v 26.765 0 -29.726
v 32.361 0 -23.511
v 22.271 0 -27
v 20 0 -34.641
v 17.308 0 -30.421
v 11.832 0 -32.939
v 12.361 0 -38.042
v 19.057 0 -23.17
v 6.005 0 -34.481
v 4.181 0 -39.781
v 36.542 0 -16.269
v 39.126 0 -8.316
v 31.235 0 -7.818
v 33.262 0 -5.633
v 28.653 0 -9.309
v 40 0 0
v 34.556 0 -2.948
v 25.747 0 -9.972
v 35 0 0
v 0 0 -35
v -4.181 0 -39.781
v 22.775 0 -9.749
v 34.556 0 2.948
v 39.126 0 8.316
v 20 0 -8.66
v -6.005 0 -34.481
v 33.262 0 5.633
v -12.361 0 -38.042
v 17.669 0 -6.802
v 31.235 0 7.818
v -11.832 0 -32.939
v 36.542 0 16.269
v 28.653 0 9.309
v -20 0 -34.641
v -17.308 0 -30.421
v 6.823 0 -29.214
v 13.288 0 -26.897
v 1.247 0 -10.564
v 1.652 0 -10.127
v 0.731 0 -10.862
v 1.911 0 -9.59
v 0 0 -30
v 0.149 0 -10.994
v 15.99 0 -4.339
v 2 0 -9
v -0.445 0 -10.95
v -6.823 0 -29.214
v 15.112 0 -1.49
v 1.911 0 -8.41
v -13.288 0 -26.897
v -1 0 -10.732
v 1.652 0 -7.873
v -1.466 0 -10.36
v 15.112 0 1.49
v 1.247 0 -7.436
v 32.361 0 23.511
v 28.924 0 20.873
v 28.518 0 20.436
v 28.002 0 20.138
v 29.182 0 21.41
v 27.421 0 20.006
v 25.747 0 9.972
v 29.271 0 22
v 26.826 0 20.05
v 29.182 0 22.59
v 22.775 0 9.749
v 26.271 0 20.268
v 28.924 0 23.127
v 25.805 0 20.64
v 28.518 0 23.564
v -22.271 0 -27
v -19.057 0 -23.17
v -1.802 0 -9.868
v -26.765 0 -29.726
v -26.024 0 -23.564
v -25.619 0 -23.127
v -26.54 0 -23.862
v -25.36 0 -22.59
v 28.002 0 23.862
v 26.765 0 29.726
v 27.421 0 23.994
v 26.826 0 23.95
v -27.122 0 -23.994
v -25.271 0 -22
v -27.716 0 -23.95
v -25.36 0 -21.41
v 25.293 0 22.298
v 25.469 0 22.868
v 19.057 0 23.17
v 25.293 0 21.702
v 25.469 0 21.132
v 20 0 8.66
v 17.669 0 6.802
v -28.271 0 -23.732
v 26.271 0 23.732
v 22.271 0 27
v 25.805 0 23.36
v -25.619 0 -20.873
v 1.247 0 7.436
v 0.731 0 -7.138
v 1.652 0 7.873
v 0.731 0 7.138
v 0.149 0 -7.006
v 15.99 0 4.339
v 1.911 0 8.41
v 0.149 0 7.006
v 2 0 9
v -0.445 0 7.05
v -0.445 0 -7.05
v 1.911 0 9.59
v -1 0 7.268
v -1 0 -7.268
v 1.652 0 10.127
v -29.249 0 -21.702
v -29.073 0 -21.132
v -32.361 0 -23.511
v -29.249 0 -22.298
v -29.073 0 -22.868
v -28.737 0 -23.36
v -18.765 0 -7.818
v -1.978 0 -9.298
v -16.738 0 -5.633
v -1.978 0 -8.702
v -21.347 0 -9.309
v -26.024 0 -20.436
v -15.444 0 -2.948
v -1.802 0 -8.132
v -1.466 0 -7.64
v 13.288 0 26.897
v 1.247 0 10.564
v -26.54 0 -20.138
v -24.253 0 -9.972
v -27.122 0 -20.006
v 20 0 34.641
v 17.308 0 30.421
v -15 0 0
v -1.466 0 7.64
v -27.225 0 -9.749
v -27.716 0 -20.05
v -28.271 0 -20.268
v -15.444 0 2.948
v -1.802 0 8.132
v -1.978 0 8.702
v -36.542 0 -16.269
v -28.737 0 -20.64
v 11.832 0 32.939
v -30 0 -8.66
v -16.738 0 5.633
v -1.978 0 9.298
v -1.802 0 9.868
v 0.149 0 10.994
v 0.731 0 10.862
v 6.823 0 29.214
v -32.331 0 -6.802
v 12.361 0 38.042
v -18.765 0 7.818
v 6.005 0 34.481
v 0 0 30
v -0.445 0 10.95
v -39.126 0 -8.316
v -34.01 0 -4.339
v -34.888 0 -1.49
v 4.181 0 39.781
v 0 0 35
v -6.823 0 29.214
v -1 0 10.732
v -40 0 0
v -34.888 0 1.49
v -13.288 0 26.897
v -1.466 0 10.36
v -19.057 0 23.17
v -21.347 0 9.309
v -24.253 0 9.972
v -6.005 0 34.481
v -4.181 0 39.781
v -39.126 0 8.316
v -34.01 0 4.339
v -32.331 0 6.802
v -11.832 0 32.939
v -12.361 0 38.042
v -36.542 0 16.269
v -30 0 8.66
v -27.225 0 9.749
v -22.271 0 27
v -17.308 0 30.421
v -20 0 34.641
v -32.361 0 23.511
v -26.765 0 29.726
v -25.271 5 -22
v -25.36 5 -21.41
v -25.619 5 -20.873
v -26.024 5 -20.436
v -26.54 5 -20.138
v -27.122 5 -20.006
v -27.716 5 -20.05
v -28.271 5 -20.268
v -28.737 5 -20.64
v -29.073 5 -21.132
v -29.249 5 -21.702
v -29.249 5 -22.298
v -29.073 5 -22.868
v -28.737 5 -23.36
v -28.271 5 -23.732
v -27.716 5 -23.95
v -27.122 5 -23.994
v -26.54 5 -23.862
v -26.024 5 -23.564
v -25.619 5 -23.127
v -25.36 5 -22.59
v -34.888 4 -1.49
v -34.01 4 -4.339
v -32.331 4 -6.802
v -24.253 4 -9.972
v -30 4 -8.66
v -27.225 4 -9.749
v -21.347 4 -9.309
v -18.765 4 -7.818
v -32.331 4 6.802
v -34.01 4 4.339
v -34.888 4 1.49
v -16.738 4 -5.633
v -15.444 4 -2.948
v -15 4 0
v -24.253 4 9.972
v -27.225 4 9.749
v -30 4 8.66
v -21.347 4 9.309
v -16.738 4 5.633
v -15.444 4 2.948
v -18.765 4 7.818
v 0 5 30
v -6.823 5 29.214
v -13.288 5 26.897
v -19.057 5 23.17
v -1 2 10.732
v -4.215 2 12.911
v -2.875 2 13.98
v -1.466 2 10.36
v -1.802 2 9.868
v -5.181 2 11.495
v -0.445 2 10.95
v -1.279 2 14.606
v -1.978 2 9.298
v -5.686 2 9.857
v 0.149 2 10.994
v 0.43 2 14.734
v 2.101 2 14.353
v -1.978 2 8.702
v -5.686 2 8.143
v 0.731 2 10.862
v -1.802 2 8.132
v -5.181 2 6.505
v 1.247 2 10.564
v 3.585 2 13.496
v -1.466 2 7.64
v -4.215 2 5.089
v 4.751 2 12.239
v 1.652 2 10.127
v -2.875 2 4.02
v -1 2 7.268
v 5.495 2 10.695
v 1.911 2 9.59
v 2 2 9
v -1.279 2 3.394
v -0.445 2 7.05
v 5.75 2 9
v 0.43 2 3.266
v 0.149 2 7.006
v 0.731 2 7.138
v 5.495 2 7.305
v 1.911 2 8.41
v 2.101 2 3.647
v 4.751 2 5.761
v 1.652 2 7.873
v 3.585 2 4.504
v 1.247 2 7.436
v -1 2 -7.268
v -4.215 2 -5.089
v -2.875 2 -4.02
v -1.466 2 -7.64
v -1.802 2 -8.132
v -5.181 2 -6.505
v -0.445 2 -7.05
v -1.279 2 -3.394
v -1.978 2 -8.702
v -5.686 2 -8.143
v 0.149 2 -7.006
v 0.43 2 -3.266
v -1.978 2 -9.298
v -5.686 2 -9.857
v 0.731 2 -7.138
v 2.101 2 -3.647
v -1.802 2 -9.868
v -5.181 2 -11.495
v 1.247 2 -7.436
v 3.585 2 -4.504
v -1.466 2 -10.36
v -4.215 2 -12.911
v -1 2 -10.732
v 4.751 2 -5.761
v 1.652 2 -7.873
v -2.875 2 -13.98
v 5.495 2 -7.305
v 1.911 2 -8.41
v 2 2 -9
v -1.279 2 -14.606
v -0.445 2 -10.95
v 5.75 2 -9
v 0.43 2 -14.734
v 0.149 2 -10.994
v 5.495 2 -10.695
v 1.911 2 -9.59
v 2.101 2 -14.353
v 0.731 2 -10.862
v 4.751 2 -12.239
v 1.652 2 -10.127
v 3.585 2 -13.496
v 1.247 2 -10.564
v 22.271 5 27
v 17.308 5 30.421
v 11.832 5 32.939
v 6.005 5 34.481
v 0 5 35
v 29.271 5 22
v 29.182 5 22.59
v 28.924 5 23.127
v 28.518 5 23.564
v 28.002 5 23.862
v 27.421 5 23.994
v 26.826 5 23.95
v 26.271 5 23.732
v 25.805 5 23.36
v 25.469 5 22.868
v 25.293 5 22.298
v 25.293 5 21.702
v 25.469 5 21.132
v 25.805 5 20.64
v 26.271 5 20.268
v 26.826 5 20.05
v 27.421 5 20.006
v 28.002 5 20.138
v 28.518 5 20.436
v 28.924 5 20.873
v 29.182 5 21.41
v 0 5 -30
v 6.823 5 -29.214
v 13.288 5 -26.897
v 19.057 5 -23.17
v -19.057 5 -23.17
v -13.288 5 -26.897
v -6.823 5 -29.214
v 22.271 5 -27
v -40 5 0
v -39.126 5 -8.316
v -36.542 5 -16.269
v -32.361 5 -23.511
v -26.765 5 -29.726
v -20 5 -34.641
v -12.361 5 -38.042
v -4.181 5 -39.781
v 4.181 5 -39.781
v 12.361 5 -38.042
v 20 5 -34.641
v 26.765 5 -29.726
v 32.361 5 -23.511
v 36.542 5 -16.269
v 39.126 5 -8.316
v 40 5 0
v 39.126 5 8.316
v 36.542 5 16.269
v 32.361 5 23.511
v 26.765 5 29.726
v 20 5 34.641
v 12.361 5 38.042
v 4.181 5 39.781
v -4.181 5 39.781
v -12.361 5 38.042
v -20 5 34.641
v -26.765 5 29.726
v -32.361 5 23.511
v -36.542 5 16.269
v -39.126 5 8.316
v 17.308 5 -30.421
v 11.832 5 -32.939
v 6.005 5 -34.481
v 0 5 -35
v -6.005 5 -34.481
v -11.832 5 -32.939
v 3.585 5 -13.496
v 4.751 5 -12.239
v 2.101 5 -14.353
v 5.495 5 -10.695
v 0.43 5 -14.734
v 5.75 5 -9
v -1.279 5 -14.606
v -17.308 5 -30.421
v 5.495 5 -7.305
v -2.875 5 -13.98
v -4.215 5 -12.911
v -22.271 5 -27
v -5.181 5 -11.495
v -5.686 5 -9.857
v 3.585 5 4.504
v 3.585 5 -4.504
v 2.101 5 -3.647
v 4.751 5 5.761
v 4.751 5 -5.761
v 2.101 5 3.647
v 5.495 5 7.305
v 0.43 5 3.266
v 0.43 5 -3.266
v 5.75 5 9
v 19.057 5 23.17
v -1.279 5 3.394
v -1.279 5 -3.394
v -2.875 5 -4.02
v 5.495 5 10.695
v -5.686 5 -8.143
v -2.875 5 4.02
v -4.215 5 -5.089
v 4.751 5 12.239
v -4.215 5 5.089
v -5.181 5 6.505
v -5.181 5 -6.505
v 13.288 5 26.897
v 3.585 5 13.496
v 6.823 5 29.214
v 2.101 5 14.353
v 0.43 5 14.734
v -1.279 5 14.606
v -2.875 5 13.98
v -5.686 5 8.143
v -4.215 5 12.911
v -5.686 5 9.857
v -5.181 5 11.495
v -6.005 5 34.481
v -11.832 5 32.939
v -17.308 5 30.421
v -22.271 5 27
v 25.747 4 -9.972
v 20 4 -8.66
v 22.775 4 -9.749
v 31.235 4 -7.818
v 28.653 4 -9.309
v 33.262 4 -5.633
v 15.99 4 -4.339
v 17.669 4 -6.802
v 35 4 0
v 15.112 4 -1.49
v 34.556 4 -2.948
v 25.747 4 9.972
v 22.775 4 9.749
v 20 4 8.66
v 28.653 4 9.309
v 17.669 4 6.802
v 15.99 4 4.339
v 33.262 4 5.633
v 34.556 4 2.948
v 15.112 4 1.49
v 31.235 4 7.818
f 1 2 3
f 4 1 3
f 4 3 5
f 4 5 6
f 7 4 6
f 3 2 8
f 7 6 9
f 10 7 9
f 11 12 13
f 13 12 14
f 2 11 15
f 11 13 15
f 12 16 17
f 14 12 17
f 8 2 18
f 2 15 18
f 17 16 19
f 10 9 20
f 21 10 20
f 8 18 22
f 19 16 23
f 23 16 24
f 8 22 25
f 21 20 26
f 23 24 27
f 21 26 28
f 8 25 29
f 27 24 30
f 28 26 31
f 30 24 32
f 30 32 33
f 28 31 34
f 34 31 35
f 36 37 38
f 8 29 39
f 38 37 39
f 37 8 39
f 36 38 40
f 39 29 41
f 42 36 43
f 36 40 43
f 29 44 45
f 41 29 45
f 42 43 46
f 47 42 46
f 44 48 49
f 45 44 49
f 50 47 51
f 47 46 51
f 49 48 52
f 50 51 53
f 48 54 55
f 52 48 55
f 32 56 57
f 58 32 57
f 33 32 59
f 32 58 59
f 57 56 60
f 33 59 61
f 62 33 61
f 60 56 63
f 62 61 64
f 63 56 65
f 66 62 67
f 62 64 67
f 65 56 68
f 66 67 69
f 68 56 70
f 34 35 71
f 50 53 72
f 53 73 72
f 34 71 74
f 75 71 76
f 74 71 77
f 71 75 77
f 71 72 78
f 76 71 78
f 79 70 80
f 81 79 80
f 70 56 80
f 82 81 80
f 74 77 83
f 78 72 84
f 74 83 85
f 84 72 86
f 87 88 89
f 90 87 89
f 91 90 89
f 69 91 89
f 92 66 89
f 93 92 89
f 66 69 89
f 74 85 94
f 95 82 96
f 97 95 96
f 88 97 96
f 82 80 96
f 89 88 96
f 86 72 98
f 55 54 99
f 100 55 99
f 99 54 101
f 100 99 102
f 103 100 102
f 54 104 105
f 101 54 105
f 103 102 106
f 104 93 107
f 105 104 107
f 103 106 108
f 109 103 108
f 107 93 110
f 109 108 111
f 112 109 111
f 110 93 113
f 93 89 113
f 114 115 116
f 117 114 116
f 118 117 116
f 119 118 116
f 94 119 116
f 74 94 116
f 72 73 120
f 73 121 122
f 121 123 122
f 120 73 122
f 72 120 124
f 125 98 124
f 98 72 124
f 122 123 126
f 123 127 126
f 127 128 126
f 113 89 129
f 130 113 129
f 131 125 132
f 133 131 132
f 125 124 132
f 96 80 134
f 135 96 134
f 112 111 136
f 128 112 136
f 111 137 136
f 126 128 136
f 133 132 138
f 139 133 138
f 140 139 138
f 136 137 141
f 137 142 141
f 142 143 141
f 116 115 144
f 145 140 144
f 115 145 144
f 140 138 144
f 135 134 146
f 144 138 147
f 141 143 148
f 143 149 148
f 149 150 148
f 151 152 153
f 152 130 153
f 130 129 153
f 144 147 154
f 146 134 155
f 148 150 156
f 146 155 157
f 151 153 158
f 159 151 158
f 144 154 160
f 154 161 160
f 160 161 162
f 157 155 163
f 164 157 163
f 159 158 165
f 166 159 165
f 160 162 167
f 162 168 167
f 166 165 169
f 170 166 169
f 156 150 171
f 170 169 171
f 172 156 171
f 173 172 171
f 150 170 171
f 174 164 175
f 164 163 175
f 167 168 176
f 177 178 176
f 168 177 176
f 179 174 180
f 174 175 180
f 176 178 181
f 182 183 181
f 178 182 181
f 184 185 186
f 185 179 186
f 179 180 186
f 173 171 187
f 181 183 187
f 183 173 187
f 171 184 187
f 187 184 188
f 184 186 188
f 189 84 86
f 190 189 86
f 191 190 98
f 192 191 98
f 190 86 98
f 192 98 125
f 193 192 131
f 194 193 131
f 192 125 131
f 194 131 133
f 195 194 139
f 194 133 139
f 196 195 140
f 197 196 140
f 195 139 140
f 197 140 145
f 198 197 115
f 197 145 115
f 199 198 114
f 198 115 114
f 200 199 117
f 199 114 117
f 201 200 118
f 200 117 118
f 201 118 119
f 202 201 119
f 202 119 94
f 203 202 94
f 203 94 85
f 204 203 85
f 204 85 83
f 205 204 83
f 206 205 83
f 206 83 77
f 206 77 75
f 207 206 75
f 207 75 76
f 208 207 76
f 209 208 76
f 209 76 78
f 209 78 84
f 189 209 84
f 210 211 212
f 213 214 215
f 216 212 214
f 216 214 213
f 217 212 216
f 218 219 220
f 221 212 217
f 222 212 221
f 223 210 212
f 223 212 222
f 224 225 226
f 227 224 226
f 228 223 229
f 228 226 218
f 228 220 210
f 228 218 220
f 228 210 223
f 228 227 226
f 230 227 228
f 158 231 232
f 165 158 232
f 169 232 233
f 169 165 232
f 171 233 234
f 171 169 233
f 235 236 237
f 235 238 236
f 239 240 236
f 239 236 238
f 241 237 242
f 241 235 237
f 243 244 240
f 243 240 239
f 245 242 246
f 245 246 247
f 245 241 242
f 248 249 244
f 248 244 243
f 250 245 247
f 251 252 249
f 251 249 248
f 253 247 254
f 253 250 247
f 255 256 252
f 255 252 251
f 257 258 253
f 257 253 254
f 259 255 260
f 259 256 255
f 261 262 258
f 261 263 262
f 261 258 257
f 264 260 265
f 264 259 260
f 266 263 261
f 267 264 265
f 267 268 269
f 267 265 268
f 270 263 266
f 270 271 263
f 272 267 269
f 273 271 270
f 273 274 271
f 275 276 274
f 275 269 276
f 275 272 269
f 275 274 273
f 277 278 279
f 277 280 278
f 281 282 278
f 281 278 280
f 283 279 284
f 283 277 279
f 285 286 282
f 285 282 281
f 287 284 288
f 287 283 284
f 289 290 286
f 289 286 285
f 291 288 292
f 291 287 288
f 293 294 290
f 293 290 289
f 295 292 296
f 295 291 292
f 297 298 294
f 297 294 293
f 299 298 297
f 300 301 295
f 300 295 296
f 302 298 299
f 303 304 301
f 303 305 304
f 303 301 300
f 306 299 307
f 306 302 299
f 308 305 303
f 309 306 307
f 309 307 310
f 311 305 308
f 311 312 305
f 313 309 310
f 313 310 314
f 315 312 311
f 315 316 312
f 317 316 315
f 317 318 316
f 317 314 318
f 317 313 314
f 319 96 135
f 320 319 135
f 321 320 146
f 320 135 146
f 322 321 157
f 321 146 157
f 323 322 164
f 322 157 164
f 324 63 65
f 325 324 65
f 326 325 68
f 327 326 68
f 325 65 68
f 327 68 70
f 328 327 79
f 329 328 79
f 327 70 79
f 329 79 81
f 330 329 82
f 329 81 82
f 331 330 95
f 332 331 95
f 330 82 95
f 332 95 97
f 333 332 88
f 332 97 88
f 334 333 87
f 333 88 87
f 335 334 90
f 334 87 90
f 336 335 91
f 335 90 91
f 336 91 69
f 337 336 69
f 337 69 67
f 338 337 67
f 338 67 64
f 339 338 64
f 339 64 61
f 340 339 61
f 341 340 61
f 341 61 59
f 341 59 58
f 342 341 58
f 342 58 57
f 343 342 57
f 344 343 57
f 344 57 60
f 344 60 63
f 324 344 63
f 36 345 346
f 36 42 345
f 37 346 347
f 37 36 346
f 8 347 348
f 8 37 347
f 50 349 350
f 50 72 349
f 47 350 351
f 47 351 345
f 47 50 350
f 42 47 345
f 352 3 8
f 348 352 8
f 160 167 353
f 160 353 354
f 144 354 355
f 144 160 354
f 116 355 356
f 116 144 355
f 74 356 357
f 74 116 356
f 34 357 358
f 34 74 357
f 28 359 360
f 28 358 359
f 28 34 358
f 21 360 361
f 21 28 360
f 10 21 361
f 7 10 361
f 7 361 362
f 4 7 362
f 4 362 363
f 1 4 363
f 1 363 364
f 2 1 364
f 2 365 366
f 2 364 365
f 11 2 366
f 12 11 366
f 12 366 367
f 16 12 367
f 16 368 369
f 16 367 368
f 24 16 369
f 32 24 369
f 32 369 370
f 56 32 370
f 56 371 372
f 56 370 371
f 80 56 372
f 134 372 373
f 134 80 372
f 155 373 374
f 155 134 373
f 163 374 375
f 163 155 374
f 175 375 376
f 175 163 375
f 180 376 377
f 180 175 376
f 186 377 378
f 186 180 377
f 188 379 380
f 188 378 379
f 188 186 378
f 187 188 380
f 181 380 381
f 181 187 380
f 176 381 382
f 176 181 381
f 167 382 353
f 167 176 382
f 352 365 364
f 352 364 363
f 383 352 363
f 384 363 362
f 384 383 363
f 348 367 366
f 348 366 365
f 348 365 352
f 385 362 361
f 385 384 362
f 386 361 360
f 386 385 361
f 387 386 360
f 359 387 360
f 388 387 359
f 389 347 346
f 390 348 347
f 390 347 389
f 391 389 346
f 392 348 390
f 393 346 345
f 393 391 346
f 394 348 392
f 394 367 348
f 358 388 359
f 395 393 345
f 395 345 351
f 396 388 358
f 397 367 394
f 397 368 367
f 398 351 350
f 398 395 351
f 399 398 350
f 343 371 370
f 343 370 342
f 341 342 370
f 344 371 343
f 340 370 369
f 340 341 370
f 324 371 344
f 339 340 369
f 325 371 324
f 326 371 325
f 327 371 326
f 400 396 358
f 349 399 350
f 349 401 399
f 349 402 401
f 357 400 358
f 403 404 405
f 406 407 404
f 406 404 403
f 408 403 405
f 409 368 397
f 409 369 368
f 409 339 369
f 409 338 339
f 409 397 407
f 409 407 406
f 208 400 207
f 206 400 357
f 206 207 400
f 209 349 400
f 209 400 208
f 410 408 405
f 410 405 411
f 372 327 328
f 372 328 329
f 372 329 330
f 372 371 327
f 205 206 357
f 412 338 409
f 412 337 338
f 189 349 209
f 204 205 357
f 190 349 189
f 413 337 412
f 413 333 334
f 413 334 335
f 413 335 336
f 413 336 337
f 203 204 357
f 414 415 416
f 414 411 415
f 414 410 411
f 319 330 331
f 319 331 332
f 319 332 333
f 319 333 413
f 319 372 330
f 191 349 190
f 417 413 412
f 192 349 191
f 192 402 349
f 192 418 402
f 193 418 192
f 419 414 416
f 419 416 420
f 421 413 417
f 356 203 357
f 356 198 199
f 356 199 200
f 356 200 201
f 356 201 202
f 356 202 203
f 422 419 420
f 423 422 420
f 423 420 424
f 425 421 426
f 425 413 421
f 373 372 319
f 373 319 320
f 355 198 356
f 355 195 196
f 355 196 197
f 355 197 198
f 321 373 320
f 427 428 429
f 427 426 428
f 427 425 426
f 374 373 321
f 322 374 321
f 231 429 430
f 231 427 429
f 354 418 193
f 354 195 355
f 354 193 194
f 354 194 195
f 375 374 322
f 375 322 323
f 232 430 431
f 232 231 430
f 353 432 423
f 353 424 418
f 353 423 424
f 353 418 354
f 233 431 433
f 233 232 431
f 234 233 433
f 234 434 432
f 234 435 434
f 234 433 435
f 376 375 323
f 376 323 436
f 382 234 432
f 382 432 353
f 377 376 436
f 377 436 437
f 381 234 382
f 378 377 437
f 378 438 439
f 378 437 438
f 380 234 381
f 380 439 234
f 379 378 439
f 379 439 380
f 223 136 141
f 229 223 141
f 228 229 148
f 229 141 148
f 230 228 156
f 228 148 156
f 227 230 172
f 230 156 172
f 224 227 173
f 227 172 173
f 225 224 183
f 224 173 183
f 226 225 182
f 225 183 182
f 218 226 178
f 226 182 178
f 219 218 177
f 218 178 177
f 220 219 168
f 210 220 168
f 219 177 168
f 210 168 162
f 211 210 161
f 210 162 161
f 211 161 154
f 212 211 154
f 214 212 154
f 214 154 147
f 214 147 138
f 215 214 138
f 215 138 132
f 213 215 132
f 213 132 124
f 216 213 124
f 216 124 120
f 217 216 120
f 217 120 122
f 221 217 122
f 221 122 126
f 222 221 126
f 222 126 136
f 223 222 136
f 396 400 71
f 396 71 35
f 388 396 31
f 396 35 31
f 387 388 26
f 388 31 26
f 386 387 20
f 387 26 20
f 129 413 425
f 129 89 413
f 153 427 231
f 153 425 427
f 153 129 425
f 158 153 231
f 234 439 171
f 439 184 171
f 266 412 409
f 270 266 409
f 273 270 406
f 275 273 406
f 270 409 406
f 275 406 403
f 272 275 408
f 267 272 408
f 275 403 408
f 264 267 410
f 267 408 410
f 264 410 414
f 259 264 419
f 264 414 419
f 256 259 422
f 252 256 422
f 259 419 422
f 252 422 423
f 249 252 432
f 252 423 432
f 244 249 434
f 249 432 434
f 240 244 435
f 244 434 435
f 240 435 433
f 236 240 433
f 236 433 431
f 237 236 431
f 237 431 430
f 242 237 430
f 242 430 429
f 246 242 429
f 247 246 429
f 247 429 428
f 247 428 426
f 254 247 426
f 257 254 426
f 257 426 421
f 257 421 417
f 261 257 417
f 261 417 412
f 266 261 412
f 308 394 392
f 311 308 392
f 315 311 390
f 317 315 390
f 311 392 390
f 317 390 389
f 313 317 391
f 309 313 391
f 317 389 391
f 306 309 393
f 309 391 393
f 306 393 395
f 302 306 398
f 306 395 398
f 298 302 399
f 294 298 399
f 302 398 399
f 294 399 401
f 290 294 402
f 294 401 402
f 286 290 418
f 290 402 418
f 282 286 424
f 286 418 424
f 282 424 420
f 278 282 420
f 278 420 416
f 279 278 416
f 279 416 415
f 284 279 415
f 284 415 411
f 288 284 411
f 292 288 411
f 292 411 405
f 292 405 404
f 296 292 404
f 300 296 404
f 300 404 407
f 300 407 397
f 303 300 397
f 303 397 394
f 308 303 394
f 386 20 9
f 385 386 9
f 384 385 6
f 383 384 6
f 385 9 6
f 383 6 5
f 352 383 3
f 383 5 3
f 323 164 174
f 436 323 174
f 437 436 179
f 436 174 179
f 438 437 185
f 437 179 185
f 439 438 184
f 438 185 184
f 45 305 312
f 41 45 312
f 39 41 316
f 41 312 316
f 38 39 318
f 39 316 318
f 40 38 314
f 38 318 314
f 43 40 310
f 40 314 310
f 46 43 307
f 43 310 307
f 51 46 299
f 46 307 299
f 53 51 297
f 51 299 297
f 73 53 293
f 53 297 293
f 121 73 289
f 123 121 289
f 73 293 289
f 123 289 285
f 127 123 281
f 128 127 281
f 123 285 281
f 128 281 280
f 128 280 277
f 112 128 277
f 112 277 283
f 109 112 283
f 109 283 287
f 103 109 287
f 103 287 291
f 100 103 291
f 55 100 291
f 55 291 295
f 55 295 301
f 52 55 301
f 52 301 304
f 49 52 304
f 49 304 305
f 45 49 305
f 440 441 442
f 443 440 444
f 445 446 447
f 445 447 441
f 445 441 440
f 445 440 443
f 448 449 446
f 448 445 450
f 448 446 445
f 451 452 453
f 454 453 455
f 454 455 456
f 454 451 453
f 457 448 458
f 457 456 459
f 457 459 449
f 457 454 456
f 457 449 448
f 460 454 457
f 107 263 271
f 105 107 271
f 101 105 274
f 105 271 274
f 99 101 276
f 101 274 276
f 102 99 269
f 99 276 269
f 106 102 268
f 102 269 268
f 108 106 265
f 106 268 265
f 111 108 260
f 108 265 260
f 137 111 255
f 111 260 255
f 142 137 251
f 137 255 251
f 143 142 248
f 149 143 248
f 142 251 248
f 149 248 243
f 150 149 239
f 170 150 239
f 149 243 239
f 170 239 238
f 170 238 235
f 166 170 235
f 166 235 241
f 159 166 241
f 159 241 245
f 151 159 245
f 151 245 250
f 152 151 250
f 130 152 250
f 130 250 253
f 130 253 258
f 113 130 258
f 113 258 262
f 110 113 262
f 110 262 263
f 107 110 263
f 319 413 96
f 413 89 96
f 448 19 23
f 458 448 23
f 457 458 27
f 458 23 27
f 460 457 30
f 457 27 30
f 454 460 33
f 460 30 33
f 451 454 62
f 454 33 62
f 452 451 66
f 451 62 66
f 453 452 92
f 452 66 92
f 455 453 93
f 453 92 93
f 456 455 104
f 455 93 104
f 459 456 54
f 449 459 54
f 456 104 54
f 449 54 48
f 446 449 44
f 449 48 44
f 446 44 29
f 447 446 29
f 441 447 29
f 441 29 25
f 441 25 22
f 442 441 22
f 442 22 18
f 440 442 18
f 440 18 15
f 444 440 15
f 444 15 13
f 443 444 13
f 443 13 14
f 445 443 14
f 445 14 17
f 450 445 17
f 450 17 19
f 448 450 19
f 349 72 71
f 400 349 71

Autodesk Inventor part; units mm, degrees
ref_plane "YZ Plane" through (0, 0, 0) normal (1, 0, 0) x (0, 1, 0)
ref_plane "XZ Plane" through (0, 0, 0) normal (0, 1, 0) x (-1, 0, 0)
sketch "Sketch1" plane through (0, 0, 0) normal (0, 1, 0) x (-1, 0, 0)
  circle A0 centre (0, 0) radius 40
  dimension "d0" = 80
sketch "Sketch1 outline for Extrusion1" plane through (0, 0, 0) normal (0, 1, 0) x (-1, 0, 0)
  circle A0 centre (0, 0) radius 40
extrude "Extrusion1" add sketch "Sketch1 outline for Extrusion1" along normal blind 5
sketch "Sketch3" plane through (0, 5, 0) normal (0, 1, 0) x (1, 0, 0)
  line L0 (0, 0) -> (-5, 0)
  line L1 (0, 0) -> (5, 0)
  line L2 (0, 0) -> (0, -9)
  line L3 (0, 0) -> (0, 9)
  circle A0 centre (0, 9) radius 2
  circle A1 centre (0, -9) radius 2
  dimension "d63" = 9
  dimension "d64" = 9
  dimension "d65" = 4
  dimension "d66" = 4
sketch "Sketch3 outline for Extrusion3" plane through (0, 5, 0) normal (0, 1, 0) x (1, 0, 0)
  circle A0 centre (0, 9) radius 2
  circle A1 centre (0, -9) radius 2
extrude "Extrusion3" cut sketch "Sketch3 outline for Extrusion3" against normal up to surface (5 mm away)
sketch "Sketch6" plane through (0, 0, 0) normal (0, -1, 0) x (1, 0, 0)
  line L0 (0, 0) -> (-25, 0)
  line L1 (0, 0) -> (25, 0)
  circle A0 centre (25, 0) radius 10
  circle A1 centre (-25, 0) radius 10
  dimension "d18" = 25
  dimension "d19" = 25
  dimension "d20" = 20
  dimension "d21" = 20
sketch "Sketch6 outline for Extrusion5" plane through (0, 0, 0) normal (0, -1, 0) x (1, 0, 0)
  circle A0 centre (25, 0) radius 10
  circle A1 centre (-25, 0) radius 10
extrude "Extrusion5" cut sketch "Sketch6 outline for Extrusion5" against normal blind 4
sketch "Sketch8" plane through (0, 0, 0) normal (0, -1, 0) x (1, 0, 0)
  circle A0 centre (0, 0) radius 40
  line L0 (0, 40) -> (0, 35)
  line L1 (0, 35) -> (0, 30)
  line L2 (0, 30) -> (0, 27)
  circle A1 centre (0, 0) radius 35
  circle A2 centre (0, 0) radius 30
  line L3 (0, 27) -> (30, 27)
  line L4 (22.271057, 27) -> (19.056987, 23.169619)
  line L5 (22.271057, 27) -> (27.271264, 27) construction
  line L6 (-40, 0) -> (40, 0)
  line L7 (22.271057, -27) -> (19.056987, -23.169619)
  line L8 (0, -40) -> (0, -30)
  point P0 (0, -35)
  dimension "d46" = 5
  dimension "d47" = 5
  dimension "d48" = 3
  dimension "d49" = 130
sketch "Sketch8 outline for Extrusion7" plane through (0, 0, 0) normal (0, -1, 0) x (1, 0, 0)
  line L0 (0, -30) -> (0, -35)
  arc A0 (19.056987, -23.169619) -> (0, -30) centre (0, 0) cw
  line L1 (22.271057, -27) -> (19.056987, -23.169619)
  arc A1 (0, -35) -> (22.271057, -27) centre (0, 0) ccw
  arc A2 (22.271057, 27) -> (0, 35) centre (0, 0) ccw
  line L2 (19.056987, 23.169619) -> (22.271057, 27)
  arc A3 (0, 30) -> (19.056987, 23.169619) centre (0, 0) cw
  line L3 (0, 35) -> (0, 30)
extrude "Extrusion7" cut sketch "Sketch8 outline for Extrusion7" against normal up to surface (5 mm away)
ref_plane "Work Plane1" through (0, 0, 32.5) normal (1, 0, 0) x (0, 0, -1)
mirror "Mirror1" about plane through (0, 0, 32.5) normal (1, 0, 0) of "Extrusion7"
sketch "Sketch11" plane through (0, 5, 0) normal (0, 1, 0) x (1, 0, 0)
  circle A0 centre (0, -9) radius 2 projected
  circle A1 centre (0, -9) radius 5.75
  circle A2 centre (0, 9) radius 2 projected
  circle A3 centre (0, 9) radius 5.75
  point P0 (0, 0)
  dimension "d67" = 11.5
  dimension "d68" = 11.5
sketch "Sketch11 outline for Extrusion10" plane through (0, 5, 0) normal (0, 1, 0) x (1, 0, 0)
  circle A0 centre (0, 9) radius 5.75
  circle A1 centre (0, 9) radius 2
  circle A2 centre (0, -9) radius 5.75
  circle A3 centre (0, -9) radius 2
extrude "Extrusion10" cut sketch "Sketch11 outline for Extrusion10" against normal blind 3
sketch "Sketch12" plane through (0, 0, 0) normal (0, -1, 0) x (1, 0, 0)
  circle A0 centre (0, 0) radius 40
  line L0 (0, -40) -> (0, -35)
  arc A1 (-22.271057, -27) -> (22.271057, -27) centre (0, 0) ccw
  arc A2 (-19.056987, -23.169619) -> (19.056987, -23.169619) centre (0, 0) ccw
  circle A3 centre (-25, 0) radius 10
  line L1 (22.271057, 27) -> (22.271057, 22)
  line L2 (22.271057, 22) -> (27.271057, 22)
  circle A4 centre (27.271057, 22) radius 2
  line L3 (-22.271057, -27) -> (-22.271057, -22)
  line L4 (-22.271057, -22) -> (-27.271057, -22)
  circle A5 centre (-27.271057, -22) radius 2
  dimension "d71" = 5
  dimension "d72" = 5
  dimension "d73" = 4
  dimension "d74" = 5
  dimension "d75" = 5
  dimension "d76" = 4
sketch "Sketch12 outline for Extrusion11" plane through (0, 0, 0) normal (0, -1, 0) x (1, 0, 0)
  circle A0 centre (-27.271057, -22) radius 2
  circle A1 centre (27.271057, 22) radius 2
extrude "Extrusion11" cut sketch "Sketch12 outline for Extrusion11" against normal up to surface (5 mm away)
properties part number "Wrist_Arm"
